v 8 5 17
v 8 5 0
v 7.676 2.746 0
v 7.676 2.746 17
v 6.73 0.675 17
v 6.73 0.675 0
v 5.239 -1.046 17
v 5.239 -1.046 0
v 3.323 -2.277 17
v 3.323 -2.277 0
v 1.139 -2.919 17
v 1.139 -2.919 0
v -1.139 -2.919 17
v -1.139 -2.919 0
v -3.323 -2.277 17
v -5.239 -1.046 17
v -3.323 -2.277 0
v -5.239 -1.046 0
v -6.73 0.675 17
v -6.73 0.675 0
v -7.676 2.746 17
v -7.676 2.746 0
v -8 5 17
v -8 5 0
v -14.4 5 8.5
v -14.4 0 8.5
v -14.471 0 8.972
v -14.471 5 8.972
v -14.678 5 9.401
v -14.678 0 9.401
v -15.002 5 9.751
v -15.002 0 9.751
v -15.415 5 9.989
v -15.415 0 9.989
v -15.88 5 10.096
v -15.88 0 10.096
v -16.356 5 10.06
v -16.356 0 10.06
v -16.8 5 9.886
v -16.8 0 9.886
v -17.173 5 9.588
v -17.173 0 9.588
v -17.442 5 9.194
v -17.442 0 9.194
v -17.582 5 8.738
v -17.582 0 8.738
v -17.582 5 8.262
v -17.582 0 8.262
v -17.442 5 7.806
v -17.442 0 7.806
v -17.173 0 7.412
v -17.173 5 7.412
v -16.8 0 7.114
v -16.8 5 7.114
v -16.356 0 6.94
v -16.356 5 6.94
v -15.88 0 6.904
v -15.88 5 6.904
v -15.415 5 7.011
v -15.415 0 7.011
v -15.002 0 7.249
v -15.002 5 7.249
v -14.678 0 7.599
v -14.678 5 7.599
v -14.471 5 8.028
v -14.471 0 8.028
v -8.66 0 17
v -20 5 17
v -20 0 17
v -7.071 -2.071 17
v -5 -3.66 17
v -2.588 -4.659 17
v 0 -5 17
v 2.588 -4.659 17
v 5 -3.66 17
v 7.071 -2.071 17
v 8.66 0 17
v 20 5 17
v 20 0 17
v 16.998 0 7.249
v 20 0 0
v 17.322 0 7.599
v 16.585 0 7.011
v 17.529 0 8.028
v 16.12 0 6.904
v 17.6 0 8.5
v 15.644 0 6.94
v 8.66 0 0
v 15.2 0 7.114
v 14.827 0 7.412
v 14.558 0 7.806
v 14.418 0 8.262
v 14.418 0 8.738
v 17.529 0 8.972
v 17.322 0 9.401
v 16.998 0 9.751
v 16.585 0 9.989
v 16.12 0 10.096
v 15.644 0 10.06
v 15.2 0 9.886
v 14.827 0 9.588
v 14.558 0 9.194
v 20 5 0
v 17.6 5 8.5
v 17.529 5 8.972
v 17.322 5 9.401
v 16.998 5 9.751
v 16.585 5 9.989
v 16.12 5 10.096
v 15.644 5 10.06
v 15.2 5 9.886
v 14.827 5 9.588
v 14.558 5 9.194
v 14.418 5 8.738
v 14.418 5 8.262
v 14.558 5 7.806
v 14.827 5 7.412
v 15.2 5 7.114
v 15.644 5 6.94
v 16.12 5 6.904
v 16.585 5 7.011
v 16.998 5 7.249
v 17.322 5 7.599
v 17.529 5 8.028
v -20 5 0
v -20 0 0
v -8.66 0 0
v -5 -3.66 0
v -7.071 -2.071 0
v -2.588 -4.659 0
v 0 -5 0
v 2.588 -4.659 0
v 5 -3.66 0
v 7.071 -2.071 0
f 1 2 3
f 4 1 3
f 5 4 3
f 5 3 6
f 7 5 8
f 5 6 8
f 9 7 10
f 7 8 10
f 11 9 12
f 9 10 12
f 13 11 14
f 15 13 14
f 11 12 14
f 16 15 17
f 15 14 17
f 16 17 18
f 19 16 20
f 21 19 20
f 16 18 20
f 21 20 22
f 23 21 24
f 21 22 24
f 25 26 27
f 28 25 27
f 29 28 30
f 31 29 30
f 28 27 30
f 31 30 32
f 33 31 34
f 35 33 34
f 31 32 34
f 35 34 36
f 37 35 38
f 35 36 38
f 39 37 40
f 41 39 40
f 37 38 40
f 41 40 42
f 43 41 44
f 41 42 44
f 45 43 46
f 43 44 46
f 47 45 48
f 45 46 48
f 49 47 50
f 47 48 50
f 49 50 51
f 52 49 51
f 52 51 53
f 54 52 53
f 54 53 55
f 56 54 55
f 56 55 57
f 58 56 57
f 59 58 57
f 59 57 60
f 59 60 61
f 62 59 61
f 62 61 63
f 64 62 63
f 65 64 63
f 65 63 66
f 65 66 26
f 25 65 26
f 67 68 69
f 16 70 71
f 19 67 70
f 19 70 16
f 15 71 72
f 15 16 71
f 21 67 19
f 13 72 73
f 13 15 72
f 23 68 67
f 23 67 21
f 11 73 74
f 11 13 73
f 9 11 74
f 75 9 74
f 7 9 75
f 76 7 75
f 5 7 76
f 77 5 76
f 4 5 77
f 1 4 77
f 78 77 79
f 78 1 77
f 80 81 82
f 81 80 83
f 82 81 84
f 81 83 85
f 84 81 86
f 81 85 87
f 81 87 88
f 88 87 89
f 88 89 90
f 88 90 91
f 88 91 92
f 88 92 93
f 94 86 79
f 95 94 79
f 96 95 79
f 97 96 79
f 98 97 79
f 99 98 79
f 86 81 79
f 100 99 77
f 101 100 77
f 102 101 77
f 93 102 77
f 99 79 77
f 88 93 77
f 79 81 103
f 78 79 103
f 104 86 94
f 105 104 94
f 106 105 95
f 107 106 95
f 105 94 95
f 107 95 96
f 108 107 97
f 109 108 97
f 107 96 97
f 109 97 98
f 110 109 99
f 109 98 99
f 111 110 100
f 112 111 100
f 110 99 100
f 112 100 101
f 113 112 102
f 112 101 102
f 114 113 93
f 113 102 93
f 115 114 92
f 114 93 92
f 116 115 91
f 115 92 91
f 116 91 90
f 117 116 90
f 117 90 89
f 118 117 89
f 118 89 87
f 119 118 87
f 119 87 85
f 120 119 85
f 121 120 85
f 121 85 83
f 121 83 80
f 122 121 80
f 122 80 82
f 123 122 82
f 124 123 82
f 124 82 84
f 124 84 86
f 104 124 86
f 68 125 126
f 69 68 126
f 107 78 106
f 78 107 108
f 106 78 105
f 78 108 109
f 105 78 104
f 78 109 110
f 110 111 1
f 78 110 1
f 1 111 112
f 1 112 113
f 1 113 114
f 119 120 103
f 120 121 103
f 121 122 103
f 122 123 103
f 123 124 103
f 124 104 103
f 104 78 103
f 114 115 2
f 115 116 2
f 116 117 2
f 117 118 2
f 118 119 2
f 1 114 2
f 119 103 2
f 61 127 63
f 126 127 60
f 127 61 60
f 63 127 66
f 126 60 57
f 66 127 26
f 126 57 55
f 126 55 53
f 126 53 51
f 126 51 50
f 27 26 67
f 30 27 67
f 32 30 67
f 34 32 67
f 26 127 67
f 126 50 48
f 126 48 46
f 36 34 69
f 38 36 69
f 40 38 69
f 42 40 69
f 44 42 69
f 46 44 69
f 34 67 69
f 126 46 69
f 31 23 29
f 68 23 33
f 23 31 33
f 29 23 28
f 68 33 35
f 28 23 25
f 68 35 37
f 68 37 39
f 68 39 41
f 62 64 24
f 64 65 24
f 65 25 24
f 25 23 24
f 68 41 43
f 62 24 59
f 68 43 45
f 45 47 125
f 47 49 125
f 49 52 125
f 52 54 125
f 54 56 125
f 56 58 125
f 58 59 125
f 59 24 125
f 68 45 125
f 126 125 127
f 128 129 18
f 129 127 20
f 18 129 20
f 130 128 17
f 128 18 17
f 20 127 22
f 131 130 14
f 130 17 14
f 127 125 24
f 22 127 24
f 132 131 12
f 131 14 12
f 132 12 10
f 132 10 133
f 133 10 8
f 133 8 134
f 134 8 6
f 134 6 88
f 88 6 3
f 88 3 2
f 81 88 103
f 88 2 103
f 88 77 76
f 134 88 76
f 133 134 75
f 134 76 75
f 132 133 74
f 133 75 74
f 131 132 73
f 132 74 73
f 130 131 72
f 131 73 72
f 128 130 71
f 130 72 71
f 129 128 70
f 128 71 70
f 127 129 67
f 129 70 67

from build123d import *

# Parameters (mm, degrees)
F1_DEPTH = 17
F2_R     = 1.6
F3_DEPTH = 25
F5_DEPTH = 25


with BuildPart() as f1:
    # F0 (on Top) → F1 (new body)
    with BuildSketch(Plane.XY):
        with BuildLine():
            Line((-8, 5), (-20, 5))
            Line((-20, 5), (-20, -5))
            Line((-20, -5), (20, -5))
            Line((20, -5), (20, 5))
            Line((20, 5), (8, 5))
            ThreePointArc((8, 5), (0, -3), (-8, 5))
        make_face()
    extrude(amount=F1_DEPTH)

    # F2 (on face) → F3 (cut)
    with BuildSketch(Plane.XZ.offset(5)):
        with Locations((-16, 8.5)):
            Circle(F2_R)
        with Locations((16, 8.5)):
            Circle(F2_R)
    extrude(amount=-F3_DEPTH, mode=Mode.SUBTRACT)

    # F4 (on face) → F5 (cut)
    with BuildSketch(Plane.XY.offset(17)):
        with BuildLine():
            ThreePointArc((8.660254, 0), (0, -5), (-8.660254, 0))
            Line((-8.660254, 0), (-20, 0))
            Line((-20, 0), (-20, -5.929414))
            Line((-20, -5.929414), (20, -5.929414))
            Line((20, -5.929414), (20, 0))
            Line((20, 0), (8.660254, 0))
        make_face()
    extrude(amount=-F5_DEPTH, mode=Mode.SUBTRACT)


solid = f1.part
